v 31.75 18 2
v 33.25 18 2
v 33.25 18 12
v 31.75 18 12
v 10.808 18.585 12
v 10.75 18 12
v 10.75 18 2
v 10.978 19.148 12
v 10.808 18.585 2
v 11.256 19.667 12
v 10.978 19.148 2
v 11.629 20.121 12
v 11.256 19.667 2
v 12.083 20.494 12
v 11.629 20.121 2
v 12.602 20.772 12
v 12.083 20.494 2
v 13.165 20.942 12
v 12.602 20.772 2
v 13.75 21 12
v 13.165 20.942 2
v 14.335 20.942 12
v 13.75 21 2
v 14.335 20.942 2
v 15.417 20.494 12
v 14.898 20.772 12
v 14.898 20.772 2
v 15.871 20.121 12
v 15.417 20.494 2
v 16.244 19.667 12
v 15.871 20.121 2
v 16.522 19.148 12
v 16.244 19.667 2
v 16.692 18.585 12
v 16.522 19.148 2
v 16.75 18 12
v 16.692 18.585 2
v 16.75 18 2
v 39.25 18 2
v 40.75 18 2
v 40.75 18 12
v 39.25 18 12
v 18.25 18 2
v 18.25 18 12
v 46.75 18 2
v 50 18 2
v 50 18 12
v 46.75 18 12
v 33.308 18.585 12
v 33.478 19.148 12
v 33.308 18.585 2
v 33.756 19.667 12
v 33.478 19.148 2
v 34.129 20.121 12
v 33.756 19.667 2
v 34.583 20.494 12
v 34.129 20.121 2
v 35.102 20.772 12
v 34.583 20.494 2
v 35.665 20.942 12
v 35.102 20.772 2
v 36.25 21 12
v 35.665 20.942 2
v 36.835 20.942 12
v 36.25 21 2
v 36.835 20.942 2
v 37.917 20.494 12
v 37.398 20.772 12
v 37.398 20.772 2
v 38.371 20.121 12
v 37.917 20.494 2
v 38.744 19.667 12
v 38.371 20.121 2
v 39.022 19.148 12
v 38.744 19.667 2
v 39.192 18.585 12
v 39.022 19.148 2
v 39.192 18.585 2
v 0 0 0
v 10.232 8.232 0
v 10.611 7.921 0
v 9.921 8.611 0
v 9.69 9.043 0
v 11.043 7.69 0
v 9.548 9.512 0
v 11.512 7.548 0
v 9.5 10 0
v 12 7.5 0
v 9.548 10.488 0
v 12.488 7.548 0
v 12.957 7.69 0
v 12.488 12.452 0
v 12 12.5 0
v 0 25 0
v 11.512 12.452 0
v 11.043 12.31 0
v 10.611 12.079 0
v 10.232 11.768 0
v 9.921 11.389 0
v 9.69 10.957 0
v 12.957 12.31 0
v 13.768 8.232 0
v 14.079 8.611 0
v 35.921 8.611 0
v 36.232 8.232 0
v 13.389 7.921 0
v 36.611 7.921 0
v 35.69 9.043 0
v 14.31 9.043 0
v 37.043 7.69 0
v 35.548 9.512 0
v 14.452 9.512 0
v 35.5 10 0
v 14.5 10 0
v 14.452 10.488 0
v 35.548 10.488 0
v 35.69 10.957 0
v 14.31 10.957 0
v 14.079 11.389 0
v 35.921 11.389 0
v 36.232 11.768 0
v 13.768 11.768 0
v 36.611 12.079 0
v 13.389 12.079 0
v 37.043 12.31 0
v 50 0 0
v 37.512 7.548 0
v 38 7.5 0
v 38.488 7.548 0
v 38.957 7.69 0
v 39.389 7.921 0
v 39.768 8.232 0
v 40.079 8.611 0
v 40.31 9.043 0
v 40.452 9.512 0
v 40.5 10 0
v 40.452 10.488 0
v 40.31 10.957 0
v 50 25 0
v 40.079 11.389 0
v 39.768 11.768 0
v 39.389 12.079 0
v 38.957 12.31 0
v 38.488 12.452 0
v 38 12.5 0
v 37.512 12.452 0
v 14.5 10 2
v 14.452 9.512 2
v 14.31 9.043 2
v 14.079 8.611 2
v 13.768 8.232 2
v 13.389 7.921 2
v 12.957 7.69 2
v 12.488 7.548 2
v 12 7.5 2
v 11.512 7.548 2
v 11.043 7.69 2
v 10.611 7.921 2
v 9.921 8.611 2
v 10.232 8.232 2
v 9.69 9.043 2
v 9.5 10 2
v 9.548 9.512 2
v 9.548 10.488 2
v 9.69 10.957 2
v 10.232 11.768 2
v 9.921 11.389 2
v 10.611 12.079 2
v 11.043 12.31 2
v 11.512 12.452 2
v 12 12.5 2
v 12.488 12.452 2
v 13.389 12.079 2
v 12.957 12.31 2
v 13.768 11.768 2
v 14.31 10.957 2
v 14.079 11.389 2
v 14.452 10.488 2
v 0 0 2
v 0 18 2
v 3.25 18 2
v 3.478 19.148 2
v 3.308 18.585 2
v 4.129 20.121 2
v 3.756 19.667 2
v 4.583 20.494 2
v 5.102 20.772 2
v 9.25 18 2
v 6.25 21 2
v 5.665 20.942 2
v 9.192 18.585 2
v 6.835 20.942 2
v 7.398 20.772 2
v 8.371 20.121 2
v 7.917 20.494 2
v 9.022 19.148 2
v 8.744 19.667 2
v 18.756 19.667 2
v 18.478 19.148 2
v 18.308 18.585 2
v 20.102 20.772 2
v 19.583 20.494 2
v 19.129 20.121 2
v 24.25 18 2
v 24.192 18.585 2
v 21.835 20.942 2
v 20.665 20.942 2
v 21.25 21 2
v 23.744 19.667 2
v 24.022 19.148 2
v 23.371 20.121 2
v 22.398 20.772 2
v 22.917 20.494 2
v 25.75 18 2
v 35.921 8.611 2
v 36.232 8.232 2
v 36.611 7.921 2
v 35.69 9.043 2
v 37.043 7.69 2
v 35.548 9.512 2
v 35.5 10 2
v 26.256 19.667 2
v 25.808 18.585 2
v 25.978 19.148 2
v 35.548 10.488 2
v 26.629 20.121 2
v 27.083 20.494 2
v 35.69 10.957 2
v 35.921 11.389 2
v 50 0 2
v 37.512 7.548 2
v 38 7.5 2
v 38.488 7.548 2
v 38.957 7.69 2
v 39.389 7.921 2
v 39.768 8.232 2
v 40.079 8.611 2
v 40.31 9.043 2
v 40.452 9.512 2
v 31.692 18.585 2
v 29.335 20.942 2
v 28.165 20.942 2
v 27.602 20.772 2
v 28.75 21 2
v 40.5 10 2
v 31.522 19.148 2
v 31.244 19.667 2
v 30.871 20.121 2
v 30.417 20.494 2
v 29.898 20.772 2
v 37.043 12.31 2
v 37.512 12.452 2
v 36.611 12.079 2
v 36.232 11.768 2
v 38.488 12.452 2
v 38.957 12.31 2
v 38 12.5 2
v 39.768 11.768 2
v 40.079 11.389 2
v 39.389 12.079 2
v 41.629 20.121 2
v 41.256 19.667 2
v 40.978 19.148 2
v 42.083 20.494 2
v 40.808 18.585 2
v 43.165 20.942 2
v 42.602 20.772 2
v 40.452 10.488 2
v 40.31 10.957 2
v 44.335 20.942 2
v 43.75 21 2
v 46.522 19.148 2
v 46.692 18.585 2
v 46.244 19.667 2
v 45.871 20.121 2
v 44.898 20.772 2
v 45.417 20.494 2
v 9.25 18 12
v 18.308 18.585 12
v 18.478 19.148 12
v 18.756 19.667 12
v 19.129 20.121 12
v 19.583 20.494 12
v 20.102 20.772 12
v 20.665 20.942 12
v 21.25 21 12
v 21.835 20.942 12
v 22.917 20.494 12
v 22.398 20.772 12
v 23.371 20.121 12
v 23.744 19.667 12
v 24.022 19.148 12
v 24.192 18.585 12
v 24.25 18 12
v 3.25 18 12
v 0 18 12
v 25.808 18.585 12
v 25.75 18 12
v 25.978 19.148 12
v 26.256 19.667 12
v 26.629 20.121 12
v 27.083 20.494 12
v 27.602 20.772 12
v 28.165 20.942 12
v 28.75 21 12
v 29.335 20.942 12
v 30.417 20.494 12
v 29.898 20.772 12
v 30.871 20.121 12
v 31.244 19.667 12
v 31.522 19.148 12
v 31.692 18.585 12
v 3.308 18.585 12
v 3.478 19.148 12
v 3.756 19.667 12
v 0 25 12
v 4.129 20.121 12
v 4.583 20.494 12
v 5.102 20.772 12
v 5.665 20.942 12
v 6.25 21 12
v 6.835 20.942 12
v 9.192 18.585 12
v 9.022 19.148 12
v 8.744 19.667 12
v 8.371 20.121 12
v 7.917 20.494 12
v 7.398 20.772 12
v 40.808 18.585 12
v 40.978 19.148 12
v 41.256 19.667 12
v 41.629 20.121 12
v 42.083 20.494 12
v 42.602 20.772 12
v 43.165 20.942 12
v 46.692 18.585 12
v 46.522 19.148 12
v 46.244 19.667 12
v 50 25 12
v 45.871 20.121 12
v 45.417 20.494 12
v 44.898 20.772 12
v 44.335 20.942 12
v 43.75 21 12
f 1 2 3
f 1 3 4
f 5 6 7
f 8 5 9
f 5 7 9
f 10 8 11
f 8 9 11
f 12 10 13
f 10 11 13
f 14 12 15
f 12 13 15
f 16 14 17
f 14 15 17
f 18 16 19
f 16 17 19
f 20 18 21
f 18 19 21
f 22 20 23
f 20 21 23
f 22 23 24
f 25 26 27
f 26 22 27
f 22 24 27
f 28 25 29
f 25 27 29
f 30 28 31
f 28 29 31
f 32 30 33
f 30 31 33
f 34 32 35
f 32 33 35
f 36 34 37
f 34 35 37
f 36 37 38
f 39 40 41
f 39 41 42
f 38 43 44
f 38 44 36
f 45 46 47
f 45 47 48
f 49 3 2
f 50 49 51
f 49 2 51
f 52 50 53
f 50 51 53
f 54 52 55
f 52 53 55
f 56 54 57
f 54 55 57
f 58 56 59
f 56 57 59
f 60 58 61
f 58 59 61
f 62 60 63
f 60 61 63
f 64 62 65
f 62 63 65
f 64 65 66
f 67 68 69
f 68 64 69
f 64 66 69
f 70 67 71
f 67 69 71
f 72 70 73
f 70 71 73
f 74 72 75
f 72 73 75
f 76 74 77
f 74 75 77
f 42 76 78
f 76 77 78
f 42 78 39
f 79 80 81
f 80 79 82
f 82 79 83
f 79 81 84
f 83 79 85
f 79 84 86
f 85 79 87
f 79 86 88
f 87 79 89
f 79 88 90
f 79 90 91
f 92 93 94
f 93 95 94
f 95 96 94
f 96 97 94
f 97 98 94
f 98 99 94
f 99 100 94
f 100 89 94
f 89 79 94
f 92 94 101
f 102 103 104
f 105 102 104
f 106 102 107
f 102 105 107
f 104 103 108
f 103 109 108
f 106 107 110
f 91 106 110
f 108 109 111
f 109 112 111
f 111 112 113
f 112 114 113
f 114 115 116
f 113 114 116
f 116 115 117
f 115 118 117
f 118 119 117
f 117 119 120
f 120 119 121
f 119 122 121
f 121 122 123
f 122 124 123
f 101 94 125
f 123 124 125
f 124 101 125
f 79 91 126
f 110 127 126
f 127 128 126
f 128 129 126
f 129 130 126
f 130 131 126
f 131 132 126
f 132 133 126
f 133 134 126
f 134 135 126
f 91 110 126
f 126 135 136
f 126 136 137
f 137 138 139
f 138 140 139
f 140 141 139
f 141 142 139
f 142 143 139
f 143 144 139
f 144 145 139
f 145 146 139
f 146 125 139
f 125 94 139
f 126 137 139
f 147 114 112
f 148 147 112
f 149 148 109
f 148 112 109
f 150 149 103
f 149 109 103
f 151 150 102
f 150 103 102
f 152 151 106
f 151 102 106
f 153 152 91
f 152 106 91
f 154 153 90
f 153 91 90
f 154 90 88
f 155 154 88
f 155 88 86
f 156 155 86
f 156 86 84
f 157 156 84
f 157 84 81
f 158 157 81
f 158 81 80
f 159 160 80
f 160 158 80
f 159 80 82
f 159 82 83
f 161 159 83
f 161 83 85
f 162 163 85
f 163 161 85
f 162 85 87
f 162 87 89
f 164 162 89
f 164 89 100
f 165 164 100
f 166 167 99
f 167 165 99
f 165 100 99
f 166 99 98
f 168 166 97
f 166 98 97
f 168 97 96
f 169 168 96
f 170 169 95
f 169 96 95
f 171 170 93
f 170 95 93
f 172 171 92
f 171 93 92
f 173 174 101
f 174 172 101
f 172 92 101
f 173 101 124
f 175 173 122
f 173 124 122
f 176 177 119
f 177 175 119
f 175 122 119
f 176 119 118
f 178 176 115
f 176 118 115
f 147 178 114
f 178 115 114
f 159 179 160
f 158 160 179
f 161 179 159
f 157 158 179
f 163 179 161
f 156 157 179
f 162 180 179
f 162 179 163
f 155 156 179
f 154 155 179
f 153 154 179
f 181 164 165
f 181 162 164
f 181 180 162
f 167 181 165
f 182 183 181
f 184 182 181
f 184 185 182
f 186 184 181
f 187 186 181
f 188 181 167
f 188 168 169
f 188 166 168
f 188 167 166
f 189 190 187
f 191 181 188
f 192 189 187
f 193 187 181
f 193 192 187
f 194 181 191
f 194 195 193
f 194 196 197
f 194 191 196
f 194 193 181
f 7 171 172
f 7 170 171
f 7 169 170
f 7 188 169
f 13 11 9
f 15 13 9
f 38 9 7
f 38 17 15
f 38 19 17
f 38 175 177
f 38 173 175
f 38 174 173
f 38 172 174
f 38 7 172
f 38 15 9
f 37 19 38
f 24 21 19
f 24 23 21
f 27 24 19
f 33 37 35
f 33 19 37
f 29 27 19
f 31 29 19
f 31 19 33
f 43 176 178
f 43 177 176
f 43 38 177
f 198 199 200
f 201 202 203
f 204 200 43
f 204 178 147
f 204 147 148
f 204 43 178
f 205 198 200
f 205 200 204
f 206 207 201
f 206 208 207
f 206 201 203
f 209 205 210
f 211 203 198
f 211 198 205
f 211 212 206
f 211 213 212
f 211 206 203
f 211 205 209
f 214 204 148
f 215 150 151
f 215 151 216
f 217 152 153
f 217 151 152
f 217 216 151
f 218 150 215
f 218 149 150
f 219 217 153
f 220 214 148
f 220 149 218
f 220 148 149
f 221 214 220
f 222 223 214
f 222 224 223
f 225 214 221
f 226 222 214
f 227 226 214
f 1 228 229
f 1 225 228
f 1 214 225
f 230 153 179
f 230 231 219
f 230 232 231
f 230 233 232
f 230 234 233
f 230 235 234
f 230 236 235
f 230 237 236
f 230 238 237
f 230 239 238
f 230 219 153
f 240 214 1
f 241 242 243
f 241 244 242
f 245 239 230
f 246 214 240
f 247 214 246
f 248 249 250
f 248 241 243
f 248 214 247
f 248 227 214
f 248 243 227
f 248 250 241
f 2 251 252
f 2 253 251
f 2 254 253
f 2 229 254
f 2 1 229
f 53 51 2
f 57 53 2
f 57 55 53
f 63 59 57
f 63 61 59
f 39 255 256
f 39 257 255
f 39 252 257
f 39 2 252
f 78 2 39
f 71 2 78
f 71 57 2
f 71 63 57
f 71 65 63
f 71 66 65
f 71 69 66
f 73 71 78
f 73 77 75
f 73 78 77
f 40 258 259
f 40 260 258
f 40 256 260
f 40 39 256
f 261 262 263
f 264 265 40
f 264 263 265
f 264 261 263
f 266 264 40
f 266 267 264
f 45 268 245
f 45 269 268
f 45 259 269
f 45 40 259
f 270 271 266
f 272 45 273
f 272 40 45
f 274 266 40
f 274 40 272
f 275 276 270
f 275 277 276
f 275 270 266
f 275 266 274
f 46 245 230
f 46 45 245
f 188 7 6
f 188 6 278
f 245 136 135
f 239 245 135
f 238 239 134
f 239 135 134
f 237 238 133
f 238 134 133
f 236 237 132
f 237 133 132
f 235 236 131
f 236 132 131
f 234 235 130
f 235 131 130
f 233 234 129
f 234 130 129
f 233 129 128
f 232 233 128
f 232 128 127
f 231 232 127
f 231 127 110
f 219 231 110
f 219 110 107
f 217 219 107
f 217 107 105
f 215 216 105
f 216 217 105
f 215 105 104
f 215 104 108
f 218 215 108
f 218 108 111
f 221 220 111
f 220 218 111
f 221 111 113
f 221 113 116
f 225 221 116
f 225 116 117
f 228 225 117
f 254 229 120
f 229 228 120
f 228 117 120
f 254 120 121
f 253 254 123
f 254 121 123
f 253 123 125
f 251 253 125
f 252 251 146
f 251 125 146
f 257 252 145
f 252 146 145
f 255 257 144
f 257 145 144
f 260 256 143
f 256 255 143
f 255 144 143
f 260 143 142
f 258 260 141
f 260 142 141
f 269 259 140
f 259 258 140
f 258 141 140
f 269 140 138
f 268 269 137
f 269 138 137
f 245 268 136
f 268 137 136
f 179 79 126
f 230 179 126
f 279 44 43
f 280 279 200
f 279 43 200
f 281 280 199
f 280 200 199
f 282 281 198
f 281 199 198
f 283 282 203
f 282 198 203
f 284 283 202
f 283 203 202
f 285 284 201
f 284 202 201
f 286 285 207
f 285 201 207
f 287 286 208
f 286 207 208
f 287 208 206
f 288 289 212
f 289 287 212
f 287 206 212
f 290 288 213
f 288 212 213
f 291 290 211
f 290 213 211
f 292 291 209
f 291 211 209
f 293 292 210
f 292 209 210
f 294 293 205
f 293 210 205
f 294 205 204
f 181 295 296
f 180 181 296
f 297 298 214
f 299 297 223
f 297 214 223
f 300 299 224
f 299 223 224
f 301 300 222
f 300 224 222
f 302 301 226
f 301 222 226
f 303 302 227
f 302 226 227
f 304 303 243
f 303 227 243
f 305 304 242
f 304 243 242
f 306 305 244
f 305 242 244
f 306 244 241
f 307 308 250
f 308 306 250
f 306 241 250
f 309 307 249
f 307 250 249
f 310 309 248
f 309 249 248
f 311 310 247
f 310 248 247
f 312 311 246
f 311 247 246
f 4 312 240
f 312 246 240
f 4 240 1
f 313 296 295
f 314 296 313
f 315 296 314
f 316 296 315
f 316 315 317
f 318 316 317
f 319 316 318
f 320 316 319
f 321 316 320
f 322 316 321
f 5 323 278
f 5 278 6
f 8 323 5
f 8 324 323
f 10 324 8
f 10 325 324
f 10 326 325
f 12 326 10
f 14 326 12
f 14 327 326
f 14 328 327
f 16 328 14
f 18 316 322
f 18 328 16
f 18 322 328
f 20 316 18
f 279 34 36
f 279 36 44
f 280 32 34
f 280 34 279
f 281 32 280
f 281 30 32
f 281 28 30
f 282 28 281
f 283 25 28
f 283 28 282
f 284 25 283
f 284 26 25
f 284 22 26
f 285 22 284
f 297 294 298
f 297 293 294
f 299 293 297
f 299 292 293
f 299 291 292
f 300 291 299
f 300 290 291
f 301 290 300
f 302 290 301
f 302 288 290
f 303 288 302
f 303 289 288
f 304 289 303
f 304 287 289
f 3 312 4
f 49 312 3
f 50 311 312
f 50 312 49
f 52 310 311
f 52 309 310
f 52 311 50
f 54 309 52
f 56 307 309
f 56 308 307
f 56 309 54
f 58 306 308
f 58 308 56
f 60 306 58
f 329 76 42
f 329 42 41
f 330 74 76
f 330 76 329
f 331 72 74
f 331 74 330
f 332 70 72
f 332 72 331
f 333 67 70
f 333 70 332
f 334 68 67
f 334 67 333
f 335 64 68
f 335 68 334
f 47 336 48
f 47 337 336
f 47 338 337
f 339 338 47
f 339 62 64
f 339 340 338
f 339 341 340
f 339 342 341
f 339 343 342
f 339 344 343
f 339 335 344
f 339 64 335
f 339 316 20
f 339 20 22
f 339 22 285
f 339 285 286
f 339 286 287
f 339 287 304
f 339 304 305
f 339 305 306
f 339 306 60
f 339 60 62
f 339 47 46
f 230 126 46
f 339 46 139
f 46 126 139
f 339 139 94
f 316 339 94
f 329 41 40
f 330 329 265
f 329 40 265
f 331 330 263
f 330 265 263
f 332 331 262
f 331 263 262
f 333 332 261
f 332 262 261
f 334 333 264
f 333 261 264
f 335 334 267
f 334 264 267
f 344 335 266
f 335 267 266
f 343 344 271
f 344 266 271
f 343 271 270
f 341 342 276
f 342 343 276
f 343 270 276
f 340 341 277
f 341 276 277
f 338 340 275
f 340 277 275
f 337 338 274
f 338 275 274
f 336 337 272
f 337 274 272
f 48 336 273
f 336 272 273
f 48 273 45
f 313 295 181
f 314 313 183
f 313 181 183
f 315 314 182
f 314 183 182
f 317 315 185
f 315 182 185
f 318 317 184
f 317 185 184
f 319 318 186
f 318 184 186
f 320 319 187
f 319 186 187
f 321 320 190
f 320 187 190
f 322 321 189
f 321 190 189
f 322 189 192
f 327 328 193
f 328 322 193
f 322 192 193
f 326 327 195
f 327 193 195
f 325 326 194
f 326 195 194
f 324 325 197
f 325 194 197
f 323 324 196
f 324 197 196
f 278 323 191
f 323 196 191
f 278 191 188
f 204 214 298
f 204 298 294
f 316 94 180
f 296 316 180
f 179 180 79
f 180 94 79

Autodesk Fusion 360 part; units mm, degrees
sketch "Sketch1" plane through (0, 0, 0) normal (0, 0, 1) x (1, 0, 0)
  line L0 (0, 0) -> (50, 0)
  line L1 (50, 0) -> (50, 25)
  line L2 (50, 25) -> (0, 25)
  line L3 (0, 25) -> (0, 0)
  circle A0 centre (12, 10) radius 2.5
  circle A1 centre (38, 10) radius 2.5
  line L4 (0, 25) -> (50, 25)
  line L5 (50, 25) -> (50, 18)
  line L6 (50, 18) -> (0, 18)
  line L7 (0, 18) -> (0, 25)
  circle A2 centre (6.25, 18) radius 3
  circle A3 centre (13.75, 18) radius 3
  circle A4 centre (21.25, 18) radius 3
  circle A5 centre (28.75, 18) radius 3
  circle A6 centre (36.25, 18) radius 3
  circle A7 centre (43.75, 18) radius 3
  dimension "d1" = 50
  dimension "d2" = 25
  dimension "d3" = 5
  dimension "d4" = 12
  dimension "d5" = 5
  dimension "d6" = 12
  dimension "d7" = 7
  dimension "d8" = 6
  dimension "d9" = 6
  dimension "d10" = 7.5
  dimension "d11" = 6
  dimension "d12" = 6
  dimension "d13" = 6
  dimension "d14" = 6
  dimension "d15" = 7.5
  dimension "d16" = 7.5
  dimension "d17" = 7.5
  dimension "d18" = 7.5
  dimension "d19" = 6.25
  dimension "d20" = 10
  dimension "d21" = 10
extrude "Extrude1" add sketch "Sketch1" along normal blind 2
extrude "Extrude2" add sketch "Sketch1" along normal blind 12 contours L1 L2 L3 L4 L5 L6 L7 A2 A3 A4 A5 A6 A7
